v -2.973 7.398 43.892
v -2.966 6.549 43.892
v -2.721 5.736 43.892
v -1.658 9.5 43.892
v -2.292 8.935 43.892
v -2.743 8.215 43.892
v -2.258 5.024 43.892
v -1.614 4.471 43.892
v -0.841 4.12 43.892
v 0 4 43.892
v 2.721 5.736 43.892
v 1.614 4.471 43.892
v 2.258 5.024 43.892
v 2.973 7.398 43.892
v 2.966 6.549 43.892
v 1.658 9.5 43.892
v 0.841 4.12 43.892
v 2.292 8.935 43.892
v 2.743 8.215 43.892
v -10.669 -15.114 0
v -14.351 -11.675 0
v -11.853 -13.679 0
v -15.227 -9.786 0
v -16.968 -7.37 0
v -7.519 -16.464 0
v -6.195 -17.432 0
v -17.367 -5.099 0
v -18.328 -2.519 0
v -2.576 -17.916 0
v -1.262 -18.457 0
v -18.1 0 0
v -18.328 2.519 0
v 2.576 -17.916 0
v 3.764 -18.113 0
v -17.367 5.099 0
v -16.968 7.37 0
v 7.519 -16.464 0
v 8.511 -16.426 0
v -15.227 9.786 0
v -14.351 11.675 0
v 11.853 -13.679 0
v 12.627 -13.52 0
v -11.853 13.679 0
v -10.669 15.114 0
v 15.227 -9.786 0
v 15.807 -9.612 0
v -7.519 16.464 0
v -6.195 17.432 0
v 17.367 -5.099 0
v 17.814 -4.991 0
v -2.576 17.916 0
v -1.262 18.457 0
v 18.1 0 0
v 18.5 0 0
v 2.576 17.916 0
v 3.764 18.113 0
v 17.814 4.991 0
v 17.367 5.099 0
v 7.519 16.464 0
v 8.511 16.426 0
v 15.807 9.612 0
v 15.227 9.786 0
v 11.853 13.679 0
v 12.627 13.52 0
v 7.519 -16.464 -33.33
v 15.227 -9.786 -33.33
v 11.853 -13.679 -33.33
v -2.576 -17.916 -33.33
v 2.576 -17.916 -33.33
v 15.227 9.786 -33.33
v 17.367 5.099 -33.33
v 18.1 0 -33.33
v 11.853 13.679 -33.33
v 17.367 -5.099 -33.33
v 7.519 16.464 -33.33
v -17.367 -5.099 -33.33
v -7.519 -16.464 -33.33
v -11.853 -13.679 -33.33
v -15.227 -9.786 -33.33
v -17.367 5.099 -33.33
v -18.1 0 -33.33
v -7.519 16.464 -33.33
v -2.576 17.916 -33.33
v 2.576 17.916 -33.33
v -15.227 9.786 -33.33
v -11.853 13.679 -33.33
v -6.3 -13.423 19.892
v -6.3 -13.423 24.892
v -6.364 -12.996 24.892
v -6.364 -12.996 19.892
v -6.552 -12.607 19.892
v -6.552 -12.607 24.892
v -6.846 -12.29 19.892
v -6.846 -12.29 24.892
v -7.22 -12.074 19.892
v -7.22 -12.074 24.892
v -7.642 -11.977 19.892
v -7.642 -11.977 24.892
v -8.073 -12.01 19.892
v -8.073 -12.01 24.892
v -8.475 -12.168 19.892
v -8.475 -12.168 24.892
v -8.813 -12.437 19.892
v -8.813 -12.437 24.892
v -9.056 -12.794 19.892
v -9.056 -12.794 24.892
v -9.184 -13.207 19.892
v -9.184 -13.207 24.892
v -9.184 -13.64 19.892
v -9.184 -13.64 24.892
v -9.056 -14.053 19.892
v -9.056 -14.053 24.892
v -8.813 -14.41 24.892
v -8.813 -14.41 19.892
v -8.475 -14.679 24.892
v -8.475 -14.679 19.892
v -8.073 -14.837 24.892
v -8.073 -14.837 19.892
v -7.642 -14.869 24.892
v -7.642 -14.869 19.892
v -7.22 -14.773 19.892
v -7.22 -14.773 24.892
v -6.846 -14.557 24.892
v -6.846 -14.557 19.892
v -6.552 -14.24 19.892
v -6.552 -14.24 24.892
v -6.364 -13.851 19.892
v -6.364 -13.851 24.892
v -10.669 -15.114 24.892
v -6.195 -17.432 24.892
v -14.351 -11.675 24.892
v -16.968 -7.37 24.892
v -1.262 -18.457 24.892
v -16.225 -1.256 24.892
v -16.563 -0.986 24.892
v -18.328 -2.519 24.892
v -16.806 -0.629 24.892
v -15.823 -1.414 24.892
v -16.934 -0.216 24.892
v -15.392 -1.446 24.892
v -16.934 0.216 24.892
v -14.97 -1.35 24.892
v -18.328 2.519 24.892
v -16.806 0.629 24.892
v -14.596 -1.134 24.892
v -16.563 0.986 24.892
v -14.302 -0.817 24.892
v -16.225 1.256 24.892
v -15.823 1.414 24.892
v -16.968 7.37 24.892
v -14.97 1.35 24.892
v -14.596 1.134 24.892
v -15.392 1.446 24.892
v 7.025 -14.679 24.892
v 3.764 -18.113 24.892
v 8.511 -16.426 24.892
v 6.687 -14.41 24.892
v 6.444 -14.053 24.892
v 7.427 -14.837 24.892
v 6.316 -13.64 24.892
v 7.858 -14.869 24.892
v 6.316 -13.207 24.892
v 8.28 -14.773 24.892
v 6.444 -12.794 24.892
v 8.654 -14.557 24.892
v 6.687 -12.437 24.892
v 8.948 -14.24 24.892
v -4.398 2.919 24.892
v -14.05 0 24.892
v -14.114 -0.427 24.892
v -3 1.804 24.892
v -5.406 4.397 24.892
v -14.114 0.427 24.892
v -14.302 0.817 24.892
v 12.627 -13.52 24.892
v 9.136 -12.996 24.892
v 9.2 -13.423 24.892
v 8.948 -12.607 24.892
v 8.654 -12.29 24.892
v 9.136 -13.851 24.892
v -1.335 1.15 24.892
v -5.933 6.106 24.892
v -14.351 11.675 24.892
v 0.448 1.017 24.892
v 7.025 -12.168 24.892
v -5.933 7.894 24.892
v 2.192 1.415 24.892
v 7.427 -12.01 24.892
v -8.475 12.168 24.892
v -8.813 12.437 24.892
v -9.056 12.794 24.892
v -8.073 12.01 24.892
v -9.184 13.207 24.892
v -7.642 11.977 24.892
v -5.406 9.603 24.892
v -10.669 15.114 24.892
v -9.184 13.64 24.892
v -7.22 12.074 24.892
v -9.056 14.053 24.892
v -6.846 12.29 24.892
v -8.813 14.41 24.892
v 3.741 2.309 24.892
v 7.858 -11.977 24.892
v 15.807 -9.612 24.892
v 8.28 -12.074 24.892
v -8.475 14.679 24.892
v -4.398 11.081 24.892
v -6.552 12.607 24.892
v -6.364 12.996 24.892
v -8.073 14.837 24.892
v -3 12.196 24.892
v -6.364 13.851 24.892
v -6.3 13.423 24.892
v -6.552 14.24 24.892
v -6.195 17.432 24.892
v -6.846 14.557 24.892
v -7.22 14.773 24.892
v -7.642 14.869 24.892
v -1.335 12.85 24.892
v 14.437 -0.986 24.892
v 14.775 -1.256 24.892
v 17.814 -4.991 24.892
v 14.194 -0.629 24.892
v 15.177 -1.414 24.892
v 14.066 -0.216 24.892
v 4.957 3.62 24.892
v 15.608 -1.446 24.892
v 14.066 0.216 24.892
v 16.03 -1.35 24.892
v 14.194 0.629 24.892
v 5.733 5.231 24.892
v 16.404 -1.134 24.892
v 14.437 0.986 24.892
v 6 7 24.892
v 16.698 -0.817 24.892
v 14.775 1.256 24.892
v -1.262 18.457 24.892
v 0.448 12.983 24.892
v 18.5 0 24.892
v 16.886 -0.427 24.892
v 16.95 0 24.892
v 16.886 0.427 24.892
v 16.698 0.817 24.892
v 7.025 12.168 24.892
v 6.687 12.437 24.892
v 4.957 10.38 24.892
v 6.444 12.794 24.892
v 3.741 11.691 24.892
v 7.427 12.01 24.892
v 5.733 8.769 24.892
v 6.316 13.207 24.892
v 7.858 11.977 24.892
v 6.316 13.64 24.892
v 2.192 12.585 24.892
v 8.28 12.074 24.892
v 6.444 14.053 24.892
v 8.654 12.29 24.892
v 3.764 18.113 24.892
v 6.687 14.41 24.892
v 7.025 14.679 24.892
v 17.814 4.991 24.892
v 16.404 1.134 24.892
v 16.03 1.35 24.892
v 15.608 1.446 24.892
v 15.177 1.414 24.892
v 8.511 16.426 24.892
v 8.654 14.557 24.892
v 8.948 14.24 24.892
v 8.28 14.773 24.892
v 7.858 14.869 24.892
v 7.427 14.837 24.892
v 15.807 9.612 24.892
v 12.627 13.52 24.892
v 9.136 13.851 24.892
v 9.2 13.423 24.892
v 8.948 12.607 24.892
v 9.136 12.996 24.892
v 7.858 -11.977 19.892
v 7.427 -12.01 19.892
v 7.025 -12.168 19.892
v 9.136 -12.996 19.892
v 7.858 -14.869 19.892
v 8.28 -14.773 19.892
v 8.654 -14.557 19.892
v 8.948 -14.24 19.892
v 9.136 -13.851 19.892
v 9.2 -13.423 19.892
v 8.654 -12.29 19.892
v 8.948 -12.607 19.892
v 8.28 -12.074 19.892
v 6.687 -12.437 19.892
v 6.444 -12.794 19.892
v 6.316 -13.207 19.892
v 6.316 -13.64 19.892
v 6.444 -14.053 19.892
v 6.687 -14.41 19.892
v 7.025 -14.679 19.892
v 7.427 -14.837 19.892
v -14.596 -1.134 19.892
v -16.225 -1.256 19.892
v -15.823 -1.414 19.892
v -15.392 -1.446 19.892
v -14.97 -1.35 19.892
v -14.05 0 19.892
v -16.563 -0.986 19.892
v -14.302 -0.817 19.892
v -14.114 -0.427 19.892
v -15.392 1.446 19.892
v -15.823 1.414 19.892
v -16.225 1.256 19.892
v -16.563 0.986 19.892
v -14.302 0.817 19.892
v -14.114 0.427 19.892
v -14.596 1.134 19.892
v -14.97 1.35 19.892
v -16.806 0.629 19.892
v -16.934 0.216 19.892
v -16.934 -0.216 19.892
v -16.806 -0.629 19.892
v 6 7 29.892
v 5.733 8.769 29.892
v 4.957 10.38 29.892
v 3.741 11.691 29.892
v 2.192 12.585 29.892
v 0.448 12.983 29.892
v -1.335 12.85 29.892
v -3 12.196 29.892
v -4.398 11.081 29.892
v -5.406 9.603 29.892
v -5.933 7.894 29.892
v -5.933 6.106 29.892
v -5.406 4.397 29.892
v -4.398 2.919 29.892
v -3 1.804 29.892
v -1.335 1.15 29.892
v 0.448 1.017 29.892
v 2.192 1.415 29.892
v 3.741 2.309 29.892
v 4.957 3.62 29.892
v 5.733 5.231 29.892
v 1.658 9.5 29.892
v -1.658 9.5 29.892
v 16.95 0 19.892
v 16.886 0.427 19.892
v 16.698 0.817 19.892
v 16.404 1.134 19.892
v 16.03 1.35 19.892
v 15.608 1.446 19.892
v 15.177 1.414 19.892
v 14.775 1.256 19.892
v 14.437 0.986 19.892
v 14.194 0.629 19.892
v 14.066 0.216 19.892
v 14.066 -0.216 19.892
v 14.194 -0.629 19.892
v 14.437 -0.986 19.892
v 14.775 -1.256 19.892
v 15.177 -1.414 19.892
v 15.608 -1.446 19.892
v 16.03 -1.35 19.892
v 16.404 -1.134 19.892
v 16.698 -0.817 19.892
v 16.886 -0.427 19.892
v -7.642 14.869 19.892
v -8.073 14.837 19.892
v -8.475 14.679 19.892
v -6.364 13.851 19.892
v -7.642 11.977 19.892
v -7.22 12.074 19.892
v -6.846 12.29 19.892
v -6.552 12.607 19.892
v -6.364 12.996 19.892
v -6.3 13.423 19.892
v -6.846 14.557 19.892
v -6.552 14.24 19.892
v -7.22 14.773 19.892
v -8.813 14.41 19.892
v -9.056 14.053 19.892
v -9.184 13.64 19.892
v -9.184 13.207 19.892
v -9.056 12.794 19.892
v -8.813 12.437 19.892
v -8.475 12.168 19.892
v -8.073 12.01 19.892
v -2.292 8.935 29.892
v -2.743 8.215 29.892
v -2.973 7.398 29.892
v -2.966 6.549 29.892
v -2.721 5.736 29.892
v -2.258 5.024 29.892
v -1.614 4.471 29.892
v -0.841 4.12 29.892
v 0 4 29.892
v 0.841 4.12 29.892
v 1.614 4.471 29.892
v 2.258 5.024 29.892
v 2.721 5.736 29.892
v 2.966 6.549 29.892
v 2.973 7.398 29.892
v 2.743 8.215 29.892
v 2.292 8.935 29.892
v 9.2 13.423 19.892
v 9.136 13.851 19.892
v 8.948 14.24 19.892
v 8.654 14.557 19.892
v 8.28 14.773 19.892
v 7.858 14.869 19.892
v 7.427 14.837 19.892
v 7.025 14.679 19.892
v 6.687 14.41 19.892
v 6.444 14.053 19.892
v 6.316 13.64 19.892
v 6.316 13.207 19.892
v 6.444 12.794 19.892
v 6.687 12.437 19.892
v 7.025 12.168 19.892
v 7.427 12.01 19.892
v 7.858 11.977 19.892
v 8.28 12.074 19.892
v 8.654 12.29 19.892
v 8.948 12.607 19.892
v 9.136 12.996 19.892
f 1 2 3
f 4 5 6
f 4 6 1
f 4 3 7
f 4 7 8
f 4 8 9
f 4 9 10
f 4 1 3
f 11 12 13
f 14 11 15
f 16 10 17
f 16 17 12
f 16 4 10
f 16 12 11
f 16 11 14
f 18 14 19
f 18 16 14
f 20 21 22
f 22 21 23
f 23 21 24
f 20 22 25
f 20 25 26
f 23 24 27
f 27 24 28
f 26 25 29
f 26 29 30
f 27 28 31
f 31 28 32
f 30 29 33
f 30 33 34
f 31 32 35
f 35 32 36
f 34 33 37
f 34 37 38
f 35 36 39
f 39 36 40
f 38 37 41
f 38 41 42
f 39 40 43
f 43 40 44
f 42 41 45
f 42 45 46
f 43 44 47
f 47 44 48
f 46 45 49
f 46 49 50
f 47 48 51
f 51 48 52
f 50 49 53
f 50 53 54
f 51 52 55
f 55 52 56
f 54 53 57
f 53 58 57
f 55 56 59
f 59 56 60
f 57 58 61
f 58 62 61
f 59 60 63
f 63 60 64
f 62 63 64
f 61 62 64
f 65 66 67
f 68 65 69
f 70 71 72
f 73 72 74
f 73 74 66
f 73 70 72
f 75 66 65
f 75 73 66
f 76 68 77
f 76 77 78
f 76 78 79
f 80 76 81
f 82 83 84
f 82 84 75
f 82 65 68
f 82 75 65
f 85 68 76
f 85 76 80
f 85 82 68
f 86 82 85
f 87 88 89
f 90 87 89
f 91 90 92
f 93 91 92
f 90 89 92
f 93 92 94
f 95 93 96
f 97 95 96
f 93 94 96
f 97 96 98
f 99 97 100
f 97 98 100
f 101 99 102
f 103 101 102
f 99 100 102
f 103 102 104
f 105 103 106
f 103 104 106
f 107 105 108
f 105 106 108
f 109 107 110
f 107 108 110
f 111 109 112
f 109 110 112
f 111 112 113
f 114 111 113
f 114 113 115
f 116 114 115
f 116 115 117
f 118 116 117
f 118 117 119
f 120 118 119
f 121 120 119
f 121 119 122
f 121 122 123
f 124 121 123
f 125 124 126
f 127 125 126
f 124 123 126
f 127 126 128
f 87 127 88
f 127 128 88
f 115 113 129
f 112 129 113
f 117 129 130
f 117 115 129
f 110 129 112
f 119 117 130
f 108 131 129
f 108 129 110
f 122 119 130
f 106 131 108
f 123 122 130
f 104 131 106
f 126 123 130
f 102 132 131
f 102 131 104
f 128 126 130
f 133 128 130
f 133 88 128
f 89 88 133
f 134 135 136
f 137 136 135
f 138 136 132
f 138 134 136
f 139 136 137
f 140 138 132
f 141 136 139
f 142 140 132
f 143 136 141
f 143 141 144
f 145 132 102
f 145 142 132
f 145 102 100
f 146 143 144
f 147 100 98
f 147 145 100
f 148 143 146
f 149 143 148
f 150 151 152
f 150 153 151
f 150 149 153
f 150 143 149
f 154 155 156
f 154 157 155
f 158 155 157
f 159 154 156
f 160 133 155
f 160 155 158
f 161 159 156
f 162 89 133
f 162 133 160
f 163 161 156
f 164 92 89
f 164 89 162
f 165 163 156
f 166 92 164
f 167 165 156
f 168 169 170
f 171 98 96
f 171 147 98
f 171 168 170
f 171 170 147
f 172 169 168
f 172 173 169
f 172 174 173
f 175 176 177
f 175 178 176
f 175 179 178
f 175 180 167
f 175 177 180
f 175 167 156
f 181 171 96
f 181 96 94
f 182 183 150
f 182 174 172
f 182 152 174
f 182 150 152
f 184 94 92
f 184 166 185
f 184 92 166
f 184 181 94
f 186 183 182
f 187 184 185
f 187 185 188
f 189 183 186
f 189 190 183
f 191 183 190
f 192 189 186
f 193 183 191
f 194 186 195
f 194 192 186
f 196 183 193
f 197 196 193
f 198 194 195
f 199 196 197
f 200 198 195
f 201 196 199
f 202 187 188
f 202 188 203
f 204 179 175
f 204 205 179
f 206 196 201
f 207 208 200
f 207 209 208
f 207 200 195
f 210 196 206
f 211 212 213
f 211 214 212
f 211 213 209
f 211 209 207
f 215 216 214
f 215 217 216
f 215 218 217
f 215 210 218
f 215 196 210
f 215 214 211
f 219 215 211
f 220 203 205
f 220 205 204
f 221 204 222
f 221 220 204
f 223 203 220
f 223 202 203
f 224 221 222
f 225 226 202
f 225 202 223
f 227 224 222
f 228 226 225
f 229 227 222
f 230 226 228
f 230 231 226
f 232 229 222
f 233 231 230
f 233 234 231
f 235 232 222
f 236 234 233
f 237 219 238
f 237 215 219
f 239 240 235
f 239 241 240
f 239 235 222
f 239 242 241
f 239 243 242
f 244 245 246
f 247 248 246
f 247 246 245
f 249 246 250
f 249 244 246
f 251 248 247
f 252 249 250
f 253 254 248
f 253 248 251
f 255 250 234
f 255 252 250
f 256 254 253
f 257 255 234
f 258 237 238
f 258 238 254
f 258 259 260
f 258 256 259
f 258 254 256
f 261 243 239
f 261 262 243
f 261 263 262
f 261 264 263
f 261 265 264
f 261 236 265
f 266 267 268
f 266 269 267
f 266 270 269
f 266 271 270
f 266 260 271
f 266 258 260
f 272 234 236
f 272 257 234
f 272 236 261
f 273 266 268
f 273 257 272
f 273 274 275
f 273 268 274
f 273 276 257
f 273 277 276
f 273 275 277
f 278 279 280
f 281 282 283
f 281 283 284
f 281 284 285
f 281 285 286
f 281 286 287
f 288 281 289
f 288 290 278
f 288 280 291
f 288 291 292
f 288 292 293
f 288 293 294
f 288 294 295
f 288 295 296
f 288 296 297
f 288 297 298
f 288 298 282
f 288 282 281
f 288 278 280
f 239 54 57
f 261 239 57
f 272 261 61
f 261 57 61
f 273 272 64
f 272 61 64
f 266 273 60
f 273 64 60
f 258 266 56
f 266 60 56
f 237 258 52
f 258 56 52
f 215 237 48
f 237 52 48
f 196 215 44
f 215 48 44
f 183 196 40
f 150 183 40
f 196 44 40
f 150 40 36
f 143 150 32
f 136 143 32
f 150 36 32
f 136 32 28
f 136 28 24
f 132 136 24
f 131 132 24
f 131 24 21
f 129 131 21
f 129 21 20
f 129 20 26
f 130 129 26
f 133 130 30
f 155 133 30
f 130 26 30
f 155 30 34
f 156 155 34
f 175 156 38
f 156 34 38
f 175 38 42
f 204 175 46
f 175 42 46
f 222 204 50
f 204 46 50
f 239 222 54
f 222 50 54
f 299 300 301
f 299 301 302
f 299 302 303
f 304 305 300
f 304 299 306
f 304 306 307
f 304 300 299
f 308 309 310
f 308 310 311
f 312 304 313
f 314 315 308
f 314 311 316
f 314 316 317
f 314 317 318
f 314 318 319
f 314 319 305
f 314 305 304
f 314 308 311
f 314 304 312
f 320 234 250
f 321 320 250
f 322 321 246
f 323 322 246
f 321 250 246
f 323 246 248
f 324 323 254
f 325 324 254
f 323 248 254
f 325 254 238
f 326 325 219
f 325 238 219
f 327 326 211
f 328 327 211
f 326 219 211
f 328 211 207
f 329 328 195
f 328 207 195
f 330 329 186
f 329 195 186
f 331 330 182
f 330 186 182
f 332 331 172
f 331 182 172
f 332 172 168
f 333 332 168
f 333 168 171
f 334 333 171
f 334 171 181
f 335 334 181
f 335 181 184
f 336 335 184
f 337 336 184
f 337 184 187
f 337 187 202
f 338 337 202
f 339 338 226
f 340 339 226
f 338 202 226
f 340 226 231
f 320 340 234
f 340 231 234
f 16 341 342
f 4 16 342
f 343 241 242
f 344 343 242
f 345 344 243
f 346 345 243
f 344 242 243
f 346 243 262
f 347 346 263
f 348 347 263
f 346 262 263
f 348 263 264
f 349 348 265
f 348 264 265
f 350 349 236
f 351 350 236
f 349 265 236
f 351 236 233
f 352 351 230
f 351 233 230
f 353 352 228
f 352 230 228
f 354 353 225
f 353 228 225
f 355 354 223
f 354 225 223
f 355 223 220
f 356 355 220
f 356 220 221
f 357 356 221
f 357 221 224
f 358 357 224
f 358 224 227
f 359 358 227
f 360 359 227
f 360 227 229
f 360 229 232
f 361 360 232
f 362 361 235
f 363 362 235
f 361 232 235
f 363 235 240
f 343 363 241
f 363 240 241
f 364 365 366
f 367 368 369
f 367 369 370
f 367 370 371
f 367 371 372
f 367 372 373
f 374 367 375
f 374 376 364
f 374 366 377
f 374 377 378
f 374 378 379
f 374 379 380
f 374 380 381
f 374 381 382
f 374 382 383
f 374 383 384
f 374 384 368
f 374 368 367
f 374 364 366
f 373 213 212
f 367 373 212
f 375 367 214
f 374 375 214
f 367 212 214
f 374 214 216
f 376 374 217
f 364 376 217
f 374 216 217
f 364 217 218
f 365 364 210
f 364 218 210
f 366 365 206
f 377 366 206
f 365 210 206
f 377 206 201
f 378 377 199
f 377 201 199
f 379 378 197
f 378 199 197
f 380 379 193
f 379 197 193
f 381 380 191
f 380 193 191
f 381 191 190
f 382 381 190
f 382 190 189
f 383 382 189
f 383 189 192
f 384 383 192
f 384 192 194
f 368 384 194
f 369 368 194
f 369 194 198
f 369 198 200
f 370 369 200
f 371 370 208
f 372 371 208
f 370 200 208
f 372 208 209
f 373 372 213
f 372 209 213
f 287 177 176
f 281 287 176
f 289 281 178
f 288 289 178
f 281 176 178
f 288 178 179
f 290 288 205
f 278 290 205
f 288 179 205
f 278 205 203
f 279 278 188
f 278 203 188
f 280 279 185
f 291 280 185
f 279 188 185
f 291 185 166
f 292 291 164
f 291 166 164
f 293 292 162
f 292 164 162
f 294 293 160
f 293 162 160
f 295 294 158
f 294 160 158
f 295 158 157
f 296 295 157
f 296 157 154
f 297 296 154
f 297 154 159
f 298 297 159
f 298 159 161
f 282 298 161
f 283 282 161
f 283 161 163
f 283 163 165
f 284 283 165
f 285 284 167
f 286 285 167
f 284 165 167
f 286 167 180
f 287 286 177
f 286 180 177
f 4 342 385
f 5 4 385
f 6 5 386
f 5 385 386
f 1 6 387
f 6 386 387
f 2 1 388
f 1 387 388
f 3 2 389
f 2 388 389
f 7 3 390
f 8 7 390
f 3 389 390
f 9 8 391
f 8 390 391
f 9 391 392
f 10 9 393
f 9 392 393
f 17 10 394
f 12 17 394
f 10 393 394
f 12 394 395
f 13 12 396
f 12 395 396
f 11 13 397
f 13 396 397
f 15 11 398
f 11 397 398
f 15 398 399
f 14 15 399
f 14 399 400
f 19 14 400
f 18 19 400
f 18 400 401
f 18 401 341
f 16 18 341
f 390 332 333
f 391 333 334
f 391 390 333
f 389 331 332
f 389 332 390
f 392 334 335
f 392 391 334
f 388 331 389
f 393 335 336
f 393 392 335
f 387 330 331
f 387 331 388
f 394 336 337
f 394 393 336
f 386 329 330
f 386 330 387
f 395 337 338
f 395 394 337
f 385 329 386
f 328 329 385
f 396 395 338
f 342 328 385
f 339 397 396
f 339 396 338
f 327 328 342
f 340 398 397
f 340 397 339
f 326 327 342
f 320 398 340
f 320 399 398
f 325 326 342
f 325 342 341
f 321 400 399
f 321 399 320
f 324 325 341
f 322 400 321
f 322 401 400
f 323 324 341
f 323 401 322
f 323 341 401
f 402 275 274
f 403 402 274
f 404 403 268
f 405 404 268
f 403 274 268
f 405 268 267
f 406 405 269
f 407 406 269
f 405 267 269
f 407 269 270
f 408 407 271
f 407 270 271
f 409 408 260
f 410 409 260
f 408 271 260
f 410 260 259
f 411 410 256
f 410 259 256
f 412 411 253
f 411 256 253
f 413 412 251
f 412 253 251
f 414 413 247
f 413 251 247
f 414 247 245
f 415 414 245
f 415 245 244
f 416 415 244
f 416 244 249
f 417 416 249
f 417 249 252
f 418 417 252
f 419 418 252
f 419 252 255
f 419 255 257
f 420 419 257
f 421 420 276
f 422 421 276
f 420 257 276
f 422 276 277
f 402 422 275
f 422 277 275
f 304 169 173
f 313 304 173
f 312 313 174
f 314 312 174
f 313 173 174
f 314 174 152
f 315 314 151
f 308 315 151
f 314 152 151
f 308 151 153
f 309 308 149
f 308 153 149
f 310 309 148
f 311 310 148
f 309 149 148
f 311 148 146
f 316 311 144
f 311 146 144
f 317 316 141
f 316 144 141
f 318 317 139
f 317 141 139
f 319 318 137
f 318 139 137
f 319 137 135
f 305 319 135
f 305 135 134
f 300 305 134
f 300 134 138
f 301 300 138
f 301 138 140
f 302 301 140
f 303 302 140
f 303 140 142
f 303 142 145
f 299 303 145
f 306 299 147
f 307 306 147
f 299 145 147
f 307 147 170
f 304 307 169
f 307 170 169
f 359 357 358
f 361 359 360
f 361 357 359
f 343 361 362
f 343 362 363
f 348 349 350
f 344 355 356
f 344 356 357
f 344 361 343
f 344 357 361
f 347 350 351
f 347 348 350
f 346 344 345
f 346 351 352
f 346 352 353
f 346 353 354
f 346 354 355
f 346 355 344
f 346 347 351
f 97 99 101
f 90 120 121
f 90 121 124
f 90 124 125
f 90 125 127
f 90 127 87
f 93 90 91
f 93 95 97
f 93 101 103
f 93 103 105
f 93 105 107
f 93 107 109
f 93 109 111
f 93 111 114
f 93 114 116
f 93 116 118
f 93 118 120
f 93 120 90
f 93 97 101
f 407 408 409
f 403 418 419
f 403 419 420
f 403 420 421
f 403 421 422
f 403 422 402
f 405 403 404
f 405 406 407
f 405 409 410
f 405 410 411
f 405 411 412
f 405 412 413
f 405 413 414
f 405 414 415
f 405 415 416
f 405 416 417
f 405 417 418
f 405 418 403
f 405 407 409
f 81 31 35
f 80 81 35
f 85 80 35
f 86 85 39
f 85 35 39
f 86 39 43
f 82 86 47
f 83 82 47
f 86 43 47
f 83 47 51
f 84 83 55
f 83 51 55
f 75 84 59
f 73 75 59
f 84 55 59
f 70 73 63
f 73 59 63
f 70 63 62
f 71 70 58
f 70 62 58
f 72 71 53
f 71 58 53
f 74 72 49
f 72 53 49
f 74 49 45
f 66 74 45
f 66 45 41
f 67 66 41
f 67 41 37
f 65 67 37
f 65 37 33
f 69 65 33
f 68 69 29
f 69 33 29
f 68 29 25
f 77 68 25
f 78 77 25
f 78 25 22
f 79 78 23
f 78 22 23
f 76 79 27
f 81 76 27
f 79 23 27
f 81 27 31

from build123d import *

# Parameters (mm, degrees)
SKETCH1_R           = 18.5
BOSS_EXTRUDE1_DEPTH = 24.892
SKETCH2_R           = 18.1
BOSS_EXTRUDE2_DEPTH = 33.33
SKETCH3_R           = 6
BOSS_EXTRUDE3_DEPTH = 5
BOSS_EXTRUDE4_DEPTH = 14
SKETCH5_R           = 1.45
CUT_EXTRUDE1_DEPTH  = 5


with BuildPart() as part:
    # Sketch1 → Boss-Extrude1 (new body)
    with BuildSketch(Plane.XY):
        Circle(SKETCH1_R)
    extrude(amount=BOSS_EXTRUDE1_DEPTH)

    # Sketch2 → Boss-Extrude2 (add)
    with BuildSketch(Plane(origin=(0, 0, 0), x_dir=(-1, 0, 0), z_dir=(0, 0, -1))):
        Circle(SKETCH2_R)
    extrude(amount=BOSS_EXTRUDE2_DEPTH)

    # Sketch3 → Boss-Extrude3 (add)
    with BuildSketch(Plane.XY.offset(24.892)):
        with Locations((0, 7)):
            Circle(SKETCH3_R)
    extrude(amount=BOSS_EXTRUDE3_DEPTH)

    # Sketch4 → Boss-Extrude4 (add)
    with BuildSketch(Plane.XY.offset(29.892)):
        with BuildLine():
            Line((1.658312395, 9.5), (-1.658312395, 9.5))
            ThreePointArc((-1.658312395, 9.5), (0, 4), (1.658312395, 9.5))
        make_face()
    extrude(amount=BOSS_EXTRUDE4_DEPTH)

    # Sketch5 → Cut-Extrude1 (cut)
    with BuildSketch(Plane.XY.offset(24.892)):
        with Locations((15.5, 0)):
            Circle(SKETCH5_R)
        with Locations((7.75, -13.423393759)):
            Circle(SKETCH5_R)
        with Locations((-7.75, -13.423393759)):
            Circle(SKETCH5_R)
        with Locations((-15.5, 0)):
            Circle(SKETCH5_R)
        with Locations((-7.75, 13.423393759)):
            Circle(SKETCH5_R)
        with Locations((7.75, 13.423393759)):
            Circle(SKETCH5_R)
    extrude(amount=-CUT_EXTRUDE1_DEPTH, mode=Mode.SUBTRACT)


solid = part.part
